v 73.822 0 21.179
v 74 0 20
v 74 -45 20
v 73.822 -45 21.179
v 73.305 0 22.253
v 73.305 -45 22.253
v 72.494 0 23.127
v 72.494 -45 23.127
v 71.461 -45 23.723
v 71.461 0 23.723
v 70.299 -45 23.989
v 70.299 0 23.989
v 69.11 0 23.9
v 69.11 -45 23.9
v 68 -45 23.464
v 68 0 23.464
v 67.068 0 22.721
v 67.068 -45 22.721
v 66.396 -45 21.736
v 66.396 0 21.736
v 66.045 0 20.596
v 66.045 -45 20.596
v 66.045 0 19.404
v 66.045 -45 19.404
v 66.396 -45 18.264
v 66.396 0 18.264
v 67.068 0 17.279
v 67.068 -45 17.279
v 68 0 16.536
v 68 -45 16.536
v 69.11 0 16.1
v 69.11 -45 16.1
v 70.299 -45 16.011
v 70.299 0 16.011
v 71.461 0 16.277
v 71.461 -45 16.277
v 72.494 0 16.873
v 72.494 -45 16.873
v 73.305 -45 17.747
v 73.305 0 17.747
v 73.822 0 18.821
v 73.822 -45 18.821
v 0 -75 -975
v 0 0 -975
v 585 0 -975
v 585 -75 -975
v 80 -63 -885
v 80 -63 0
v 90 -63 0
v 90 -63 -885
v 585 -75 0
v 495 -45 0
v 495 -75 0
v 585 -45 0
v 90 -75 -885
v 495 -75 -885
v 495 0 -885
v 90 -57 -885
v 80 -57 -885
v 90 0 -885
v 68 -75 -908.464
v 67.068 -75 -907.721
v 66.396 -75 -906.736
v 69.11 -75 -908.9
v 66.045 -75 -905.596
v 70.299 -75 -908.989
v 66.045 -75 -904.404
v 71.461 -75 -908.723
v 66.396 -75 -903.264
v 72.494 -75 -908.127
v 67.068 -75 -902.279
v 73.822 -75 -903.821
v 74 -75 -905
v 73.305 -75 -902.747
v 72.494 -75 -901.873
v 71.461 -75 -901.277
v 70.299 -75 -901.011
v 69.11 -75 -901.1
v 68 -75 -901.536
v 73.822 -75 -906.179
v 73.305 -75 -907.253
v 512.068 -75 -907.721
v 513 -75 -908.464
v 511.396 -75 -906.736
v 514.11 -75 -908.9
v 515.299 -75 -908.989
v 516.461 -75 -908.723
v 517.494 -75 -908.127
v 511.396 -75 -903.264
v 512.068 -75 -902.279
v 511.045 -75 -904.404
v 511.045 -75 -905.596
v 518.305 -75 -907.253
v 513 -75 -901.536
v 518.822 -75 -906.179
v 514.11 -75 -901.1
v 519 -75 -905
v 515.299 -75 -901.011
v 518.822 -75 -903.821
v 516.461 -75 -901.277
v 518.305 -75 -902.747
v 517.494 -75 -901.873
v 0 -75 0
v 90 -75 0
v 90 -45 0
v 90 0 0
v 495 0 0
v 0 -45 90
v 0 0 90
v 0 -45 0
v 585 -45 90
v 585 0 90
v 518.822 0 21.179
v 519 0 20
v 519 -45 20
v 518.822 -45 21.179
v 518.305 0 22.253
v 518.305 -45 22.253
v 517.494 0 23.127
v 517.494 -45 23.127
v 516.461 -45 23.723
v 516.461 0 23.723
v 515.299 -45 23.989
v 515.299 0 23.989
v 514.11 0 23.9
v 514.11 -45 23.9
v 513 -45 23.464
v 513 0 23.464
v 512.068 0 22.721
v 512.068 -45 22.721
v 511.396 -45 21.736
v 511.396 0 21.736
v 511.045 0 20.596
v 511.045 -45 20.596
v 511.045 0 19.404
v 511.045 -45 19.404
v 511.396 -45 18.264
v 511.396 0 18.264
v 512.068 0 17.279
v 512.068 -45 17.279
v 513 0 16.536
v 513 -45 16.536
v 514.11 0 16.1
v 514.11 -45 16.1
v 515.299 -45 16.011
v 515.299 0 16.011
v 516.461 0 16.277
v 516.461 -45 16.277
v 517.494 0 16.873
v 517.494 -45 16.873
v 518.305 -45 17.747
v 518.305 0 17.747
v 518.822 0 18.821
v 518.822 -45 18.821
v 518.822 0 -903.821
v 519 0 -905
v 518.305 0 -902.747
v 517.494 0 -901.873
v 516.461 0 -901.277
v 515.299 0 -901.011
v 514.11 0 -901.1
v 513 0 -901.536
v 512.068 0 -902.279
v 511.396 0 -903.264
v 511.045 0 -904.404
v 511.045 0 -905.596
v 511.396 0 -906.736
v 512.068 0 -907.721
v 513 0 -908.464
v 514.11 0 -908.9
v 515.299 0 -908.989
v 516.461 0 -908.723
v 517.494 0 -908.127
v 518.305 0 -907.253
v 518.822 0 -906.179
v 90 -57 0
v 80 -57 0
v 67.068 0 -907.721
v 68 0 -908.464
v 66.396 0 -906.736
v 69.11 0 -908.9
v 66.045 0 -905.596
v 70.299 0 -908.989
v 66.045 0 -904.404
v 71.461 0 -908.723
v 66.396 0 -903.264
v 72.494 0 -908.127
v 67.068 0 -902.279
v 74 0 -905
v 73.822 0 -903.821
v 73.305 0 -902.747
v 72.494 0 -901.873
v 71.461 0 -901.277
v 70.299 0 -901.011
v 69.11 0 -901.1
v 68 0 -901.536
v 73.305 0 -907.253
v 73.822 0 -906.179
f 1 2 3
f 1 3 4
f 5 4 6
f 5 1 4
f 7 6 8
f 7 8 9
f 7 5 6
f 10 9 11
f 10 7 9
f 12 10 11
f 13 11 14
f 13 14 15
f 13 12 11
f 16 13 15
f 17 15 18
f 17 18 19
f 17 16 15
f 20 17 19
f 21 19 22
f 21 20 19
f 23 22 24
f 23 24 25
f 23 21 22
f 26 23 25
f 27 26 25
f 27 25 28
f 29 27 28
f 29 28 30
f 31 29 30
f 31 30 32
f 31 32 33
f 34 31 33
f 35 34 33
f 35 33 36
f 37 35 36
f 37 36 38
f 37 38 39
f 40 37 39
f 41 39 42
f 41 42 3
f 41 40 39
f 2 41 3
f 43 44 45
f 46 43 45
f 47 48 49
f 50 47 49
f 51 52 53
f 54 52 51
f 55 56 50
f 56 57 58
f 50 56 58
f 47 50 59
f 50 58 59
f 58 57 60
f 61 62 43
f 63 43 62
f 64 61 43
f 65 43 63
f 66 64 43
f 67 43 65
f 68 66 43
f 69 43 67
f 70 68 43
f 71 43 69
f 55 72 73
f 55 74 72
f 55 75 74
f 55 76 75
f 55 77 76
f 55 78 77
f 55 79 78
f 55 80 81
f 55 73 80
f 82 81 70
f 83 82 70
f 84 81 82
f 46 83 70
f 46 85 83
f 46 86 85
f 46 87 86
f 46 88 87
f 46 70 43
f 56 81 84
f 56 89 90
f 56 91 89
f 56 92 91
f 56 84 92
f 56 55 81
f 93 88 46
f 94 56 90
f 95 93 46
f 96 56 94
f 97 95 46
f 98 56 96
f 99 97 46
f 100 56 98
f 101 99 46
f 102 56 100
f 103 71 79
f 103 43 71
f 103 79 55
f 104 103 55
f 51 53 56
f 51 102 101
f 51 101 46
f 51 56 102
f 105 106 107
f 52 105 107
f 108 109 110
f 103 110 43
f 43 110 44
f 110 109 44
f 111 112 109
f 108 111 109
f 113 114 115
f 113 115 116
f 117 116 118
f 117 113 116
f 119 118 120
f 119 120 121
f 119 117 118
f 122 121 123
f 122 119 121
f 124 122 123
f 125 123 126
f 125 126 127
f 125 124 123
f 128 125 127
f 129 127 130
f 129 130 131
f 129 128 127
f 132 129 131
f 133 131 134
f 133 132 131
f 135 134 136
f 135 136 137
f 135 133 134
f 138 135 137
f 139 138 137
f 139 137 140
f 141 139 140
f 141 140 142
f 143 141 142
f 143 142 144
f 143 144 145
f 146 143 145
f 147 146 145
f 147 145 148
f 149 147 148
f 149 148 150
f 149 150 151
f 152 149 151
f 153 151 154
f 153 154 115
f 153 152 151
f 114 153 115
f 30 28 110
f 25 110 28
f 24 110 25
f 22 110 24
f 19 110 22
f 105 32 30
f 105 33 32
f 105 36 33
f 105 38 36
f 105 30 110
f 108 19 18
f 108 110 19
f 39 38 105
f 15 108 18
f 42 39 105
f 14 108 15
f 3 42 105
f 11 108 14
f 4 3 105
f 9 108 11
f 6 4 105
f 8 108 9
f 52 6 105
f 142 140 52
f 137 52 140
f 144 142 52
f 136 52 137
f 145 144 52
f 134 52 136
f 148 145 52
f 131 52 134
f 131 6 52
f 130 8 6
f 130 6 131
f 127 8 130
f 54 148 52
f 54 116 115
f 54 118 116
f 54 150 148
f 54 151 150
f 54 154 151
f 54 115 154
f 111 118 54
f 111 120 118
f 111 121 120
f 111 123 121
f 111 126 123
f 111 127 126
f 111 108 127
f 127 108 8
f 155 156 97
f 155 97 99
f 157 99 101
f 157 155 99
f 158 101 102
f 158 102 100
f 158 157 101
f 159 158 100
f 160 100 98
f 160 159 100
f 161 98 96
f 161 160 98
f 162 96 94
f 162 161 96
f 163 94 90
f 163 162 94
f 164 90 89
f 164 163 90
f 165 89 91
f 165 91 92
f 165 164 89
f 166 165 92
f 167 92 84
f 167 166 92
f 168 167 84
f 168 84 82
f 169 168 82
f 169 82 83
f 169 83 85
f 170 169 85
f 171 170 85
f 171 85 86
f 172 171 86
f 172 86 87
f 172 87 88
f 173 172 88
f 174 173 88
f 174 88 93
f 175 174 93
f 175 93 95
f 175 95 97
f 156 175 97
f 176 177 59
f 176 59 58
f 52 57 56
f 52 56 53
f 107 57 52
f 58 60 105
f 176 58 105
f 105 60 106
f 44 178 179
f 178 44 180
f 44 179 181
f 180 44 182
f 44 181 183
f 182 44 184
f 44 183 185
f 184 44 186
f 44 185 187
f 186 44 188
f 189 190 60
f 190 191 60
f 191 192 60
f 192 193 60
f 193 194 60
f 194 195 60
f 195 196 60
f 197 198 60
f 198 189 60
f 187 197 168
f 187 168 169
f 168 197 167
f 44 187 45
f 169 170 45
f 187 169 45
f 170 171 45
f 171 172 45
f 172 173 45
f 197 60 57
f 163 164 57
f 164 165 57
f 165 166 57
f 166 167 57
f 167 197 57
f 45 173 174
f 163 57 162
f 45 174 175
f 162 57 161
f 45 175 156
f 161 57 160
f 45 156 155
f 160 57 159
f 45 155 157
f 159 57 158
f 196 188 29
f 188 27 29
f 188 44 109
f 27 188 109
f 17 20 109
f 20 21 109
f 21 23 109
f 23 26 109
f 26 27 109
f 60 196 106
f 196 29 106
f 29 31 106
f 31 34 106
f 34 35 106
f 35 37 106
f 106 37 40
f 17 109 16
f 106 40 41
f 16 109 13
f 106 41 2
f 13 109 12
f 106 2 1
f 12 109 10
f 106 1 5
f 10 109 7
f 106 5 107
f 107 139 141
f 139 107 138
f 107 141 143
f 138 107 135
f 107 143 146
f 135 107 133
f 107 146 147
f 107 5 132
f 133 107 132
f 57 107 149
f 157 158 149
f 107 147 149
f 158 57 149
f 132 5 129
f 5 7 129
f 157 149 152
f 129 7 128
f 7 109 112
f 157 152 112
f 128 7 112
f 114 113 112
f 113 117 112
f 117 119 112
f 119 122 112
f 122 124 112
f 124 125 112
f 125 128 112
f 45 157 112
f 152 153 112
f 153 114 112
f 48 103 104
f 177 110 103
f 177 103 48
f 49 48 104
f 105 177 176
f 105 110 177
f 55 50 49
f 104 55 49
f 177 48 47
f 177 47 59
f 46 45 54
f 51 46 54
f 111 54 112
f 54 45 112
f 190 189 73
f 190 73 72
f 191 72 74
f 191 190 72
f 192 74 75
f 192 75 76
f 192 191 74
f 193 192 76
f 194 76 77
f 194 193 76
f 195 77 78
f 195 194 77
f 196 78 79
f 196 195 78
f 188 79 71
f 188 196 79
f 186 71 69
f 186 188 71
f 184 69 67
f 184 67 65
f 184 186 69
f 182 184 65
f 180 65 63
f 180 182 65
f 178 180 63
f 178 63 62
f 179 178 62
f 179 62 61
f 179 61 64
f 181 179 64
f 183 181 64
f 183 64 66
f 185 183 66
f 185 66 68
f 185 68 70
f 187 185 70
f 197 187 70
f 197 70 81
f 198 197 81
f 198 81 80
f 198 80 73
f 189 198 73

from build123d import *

# Parameters (mm, degrees)
F0_W     = 90
F0_H     = 885
F0_R     = 4
F1_DEPTH = 45
F2_DEPTH = 75
F3_W     = 10
F3_H     = 6
F4_DEPTH = 885


with BuildPart() as f1:
    # F0 (on Front) → F1 (new body)
    with BuildSketch(Plane.XZ):
        with Locations((540, -442.5)):
            Rectangle(F0_W, F0_H)
        Polygon((90, -885), (0, -885), (0, -975), (585, -975), (585, -885), (495, -885), align=None)
        with Locations((70, -905)):
            Circle(F0_R, mode=Mode.SUBTRACT)
        with Locations((515, -905)):
            Circle(F0_R, mode=Mode.SUBTRACT)
        with Locations((45, -442.5)):
            Rectangle(F0_W, F0_H)
        Polygon((0, 90), (0, 0), (90, 0), (495, 0), (585, 0), (585, 90), align=None)
        with Locations((70, 20)):
            Circle(F0_R, mode=Mode.SUBTRACT)
        with Locations((515, 20)):
            Circle(F0_R, mode=Mode.SUBTRACT)
    extrude(amount=F1_DEPTH)

    # F0 (on Front) → F2 (join)
    with BuildSketch(Plane.XZ):
        Polygon((90, -885), (0, -885), (0, -975), (585, -975), (585, -885), (495, -885), align=None)
        with Locations((70, -905)):
            Circle(F0_R, mode=Mode.SUBTRACT)
        with Locations((515, -905)):
            Circle(F0_R, mode=Mode.SUBTRACT)
        with Locations((45, -442.5)):
            Rectangle(F0_W, F0_H)
        with Locations((540, -442.5)):
            Rectangle(F0_W, F0_H)
    extrude(amount=F2_DEPTH)

    # F3 (on Top) → F4 (cut, through all)
    with BuildSketch(Plane.XY):
        with Locations((85, -60)):
            Rectangle(F3_W, F3_H)
    extrude(amount=-F4_DEPTH, mode=Mode.SUBTRACT)


solid = f1.part
